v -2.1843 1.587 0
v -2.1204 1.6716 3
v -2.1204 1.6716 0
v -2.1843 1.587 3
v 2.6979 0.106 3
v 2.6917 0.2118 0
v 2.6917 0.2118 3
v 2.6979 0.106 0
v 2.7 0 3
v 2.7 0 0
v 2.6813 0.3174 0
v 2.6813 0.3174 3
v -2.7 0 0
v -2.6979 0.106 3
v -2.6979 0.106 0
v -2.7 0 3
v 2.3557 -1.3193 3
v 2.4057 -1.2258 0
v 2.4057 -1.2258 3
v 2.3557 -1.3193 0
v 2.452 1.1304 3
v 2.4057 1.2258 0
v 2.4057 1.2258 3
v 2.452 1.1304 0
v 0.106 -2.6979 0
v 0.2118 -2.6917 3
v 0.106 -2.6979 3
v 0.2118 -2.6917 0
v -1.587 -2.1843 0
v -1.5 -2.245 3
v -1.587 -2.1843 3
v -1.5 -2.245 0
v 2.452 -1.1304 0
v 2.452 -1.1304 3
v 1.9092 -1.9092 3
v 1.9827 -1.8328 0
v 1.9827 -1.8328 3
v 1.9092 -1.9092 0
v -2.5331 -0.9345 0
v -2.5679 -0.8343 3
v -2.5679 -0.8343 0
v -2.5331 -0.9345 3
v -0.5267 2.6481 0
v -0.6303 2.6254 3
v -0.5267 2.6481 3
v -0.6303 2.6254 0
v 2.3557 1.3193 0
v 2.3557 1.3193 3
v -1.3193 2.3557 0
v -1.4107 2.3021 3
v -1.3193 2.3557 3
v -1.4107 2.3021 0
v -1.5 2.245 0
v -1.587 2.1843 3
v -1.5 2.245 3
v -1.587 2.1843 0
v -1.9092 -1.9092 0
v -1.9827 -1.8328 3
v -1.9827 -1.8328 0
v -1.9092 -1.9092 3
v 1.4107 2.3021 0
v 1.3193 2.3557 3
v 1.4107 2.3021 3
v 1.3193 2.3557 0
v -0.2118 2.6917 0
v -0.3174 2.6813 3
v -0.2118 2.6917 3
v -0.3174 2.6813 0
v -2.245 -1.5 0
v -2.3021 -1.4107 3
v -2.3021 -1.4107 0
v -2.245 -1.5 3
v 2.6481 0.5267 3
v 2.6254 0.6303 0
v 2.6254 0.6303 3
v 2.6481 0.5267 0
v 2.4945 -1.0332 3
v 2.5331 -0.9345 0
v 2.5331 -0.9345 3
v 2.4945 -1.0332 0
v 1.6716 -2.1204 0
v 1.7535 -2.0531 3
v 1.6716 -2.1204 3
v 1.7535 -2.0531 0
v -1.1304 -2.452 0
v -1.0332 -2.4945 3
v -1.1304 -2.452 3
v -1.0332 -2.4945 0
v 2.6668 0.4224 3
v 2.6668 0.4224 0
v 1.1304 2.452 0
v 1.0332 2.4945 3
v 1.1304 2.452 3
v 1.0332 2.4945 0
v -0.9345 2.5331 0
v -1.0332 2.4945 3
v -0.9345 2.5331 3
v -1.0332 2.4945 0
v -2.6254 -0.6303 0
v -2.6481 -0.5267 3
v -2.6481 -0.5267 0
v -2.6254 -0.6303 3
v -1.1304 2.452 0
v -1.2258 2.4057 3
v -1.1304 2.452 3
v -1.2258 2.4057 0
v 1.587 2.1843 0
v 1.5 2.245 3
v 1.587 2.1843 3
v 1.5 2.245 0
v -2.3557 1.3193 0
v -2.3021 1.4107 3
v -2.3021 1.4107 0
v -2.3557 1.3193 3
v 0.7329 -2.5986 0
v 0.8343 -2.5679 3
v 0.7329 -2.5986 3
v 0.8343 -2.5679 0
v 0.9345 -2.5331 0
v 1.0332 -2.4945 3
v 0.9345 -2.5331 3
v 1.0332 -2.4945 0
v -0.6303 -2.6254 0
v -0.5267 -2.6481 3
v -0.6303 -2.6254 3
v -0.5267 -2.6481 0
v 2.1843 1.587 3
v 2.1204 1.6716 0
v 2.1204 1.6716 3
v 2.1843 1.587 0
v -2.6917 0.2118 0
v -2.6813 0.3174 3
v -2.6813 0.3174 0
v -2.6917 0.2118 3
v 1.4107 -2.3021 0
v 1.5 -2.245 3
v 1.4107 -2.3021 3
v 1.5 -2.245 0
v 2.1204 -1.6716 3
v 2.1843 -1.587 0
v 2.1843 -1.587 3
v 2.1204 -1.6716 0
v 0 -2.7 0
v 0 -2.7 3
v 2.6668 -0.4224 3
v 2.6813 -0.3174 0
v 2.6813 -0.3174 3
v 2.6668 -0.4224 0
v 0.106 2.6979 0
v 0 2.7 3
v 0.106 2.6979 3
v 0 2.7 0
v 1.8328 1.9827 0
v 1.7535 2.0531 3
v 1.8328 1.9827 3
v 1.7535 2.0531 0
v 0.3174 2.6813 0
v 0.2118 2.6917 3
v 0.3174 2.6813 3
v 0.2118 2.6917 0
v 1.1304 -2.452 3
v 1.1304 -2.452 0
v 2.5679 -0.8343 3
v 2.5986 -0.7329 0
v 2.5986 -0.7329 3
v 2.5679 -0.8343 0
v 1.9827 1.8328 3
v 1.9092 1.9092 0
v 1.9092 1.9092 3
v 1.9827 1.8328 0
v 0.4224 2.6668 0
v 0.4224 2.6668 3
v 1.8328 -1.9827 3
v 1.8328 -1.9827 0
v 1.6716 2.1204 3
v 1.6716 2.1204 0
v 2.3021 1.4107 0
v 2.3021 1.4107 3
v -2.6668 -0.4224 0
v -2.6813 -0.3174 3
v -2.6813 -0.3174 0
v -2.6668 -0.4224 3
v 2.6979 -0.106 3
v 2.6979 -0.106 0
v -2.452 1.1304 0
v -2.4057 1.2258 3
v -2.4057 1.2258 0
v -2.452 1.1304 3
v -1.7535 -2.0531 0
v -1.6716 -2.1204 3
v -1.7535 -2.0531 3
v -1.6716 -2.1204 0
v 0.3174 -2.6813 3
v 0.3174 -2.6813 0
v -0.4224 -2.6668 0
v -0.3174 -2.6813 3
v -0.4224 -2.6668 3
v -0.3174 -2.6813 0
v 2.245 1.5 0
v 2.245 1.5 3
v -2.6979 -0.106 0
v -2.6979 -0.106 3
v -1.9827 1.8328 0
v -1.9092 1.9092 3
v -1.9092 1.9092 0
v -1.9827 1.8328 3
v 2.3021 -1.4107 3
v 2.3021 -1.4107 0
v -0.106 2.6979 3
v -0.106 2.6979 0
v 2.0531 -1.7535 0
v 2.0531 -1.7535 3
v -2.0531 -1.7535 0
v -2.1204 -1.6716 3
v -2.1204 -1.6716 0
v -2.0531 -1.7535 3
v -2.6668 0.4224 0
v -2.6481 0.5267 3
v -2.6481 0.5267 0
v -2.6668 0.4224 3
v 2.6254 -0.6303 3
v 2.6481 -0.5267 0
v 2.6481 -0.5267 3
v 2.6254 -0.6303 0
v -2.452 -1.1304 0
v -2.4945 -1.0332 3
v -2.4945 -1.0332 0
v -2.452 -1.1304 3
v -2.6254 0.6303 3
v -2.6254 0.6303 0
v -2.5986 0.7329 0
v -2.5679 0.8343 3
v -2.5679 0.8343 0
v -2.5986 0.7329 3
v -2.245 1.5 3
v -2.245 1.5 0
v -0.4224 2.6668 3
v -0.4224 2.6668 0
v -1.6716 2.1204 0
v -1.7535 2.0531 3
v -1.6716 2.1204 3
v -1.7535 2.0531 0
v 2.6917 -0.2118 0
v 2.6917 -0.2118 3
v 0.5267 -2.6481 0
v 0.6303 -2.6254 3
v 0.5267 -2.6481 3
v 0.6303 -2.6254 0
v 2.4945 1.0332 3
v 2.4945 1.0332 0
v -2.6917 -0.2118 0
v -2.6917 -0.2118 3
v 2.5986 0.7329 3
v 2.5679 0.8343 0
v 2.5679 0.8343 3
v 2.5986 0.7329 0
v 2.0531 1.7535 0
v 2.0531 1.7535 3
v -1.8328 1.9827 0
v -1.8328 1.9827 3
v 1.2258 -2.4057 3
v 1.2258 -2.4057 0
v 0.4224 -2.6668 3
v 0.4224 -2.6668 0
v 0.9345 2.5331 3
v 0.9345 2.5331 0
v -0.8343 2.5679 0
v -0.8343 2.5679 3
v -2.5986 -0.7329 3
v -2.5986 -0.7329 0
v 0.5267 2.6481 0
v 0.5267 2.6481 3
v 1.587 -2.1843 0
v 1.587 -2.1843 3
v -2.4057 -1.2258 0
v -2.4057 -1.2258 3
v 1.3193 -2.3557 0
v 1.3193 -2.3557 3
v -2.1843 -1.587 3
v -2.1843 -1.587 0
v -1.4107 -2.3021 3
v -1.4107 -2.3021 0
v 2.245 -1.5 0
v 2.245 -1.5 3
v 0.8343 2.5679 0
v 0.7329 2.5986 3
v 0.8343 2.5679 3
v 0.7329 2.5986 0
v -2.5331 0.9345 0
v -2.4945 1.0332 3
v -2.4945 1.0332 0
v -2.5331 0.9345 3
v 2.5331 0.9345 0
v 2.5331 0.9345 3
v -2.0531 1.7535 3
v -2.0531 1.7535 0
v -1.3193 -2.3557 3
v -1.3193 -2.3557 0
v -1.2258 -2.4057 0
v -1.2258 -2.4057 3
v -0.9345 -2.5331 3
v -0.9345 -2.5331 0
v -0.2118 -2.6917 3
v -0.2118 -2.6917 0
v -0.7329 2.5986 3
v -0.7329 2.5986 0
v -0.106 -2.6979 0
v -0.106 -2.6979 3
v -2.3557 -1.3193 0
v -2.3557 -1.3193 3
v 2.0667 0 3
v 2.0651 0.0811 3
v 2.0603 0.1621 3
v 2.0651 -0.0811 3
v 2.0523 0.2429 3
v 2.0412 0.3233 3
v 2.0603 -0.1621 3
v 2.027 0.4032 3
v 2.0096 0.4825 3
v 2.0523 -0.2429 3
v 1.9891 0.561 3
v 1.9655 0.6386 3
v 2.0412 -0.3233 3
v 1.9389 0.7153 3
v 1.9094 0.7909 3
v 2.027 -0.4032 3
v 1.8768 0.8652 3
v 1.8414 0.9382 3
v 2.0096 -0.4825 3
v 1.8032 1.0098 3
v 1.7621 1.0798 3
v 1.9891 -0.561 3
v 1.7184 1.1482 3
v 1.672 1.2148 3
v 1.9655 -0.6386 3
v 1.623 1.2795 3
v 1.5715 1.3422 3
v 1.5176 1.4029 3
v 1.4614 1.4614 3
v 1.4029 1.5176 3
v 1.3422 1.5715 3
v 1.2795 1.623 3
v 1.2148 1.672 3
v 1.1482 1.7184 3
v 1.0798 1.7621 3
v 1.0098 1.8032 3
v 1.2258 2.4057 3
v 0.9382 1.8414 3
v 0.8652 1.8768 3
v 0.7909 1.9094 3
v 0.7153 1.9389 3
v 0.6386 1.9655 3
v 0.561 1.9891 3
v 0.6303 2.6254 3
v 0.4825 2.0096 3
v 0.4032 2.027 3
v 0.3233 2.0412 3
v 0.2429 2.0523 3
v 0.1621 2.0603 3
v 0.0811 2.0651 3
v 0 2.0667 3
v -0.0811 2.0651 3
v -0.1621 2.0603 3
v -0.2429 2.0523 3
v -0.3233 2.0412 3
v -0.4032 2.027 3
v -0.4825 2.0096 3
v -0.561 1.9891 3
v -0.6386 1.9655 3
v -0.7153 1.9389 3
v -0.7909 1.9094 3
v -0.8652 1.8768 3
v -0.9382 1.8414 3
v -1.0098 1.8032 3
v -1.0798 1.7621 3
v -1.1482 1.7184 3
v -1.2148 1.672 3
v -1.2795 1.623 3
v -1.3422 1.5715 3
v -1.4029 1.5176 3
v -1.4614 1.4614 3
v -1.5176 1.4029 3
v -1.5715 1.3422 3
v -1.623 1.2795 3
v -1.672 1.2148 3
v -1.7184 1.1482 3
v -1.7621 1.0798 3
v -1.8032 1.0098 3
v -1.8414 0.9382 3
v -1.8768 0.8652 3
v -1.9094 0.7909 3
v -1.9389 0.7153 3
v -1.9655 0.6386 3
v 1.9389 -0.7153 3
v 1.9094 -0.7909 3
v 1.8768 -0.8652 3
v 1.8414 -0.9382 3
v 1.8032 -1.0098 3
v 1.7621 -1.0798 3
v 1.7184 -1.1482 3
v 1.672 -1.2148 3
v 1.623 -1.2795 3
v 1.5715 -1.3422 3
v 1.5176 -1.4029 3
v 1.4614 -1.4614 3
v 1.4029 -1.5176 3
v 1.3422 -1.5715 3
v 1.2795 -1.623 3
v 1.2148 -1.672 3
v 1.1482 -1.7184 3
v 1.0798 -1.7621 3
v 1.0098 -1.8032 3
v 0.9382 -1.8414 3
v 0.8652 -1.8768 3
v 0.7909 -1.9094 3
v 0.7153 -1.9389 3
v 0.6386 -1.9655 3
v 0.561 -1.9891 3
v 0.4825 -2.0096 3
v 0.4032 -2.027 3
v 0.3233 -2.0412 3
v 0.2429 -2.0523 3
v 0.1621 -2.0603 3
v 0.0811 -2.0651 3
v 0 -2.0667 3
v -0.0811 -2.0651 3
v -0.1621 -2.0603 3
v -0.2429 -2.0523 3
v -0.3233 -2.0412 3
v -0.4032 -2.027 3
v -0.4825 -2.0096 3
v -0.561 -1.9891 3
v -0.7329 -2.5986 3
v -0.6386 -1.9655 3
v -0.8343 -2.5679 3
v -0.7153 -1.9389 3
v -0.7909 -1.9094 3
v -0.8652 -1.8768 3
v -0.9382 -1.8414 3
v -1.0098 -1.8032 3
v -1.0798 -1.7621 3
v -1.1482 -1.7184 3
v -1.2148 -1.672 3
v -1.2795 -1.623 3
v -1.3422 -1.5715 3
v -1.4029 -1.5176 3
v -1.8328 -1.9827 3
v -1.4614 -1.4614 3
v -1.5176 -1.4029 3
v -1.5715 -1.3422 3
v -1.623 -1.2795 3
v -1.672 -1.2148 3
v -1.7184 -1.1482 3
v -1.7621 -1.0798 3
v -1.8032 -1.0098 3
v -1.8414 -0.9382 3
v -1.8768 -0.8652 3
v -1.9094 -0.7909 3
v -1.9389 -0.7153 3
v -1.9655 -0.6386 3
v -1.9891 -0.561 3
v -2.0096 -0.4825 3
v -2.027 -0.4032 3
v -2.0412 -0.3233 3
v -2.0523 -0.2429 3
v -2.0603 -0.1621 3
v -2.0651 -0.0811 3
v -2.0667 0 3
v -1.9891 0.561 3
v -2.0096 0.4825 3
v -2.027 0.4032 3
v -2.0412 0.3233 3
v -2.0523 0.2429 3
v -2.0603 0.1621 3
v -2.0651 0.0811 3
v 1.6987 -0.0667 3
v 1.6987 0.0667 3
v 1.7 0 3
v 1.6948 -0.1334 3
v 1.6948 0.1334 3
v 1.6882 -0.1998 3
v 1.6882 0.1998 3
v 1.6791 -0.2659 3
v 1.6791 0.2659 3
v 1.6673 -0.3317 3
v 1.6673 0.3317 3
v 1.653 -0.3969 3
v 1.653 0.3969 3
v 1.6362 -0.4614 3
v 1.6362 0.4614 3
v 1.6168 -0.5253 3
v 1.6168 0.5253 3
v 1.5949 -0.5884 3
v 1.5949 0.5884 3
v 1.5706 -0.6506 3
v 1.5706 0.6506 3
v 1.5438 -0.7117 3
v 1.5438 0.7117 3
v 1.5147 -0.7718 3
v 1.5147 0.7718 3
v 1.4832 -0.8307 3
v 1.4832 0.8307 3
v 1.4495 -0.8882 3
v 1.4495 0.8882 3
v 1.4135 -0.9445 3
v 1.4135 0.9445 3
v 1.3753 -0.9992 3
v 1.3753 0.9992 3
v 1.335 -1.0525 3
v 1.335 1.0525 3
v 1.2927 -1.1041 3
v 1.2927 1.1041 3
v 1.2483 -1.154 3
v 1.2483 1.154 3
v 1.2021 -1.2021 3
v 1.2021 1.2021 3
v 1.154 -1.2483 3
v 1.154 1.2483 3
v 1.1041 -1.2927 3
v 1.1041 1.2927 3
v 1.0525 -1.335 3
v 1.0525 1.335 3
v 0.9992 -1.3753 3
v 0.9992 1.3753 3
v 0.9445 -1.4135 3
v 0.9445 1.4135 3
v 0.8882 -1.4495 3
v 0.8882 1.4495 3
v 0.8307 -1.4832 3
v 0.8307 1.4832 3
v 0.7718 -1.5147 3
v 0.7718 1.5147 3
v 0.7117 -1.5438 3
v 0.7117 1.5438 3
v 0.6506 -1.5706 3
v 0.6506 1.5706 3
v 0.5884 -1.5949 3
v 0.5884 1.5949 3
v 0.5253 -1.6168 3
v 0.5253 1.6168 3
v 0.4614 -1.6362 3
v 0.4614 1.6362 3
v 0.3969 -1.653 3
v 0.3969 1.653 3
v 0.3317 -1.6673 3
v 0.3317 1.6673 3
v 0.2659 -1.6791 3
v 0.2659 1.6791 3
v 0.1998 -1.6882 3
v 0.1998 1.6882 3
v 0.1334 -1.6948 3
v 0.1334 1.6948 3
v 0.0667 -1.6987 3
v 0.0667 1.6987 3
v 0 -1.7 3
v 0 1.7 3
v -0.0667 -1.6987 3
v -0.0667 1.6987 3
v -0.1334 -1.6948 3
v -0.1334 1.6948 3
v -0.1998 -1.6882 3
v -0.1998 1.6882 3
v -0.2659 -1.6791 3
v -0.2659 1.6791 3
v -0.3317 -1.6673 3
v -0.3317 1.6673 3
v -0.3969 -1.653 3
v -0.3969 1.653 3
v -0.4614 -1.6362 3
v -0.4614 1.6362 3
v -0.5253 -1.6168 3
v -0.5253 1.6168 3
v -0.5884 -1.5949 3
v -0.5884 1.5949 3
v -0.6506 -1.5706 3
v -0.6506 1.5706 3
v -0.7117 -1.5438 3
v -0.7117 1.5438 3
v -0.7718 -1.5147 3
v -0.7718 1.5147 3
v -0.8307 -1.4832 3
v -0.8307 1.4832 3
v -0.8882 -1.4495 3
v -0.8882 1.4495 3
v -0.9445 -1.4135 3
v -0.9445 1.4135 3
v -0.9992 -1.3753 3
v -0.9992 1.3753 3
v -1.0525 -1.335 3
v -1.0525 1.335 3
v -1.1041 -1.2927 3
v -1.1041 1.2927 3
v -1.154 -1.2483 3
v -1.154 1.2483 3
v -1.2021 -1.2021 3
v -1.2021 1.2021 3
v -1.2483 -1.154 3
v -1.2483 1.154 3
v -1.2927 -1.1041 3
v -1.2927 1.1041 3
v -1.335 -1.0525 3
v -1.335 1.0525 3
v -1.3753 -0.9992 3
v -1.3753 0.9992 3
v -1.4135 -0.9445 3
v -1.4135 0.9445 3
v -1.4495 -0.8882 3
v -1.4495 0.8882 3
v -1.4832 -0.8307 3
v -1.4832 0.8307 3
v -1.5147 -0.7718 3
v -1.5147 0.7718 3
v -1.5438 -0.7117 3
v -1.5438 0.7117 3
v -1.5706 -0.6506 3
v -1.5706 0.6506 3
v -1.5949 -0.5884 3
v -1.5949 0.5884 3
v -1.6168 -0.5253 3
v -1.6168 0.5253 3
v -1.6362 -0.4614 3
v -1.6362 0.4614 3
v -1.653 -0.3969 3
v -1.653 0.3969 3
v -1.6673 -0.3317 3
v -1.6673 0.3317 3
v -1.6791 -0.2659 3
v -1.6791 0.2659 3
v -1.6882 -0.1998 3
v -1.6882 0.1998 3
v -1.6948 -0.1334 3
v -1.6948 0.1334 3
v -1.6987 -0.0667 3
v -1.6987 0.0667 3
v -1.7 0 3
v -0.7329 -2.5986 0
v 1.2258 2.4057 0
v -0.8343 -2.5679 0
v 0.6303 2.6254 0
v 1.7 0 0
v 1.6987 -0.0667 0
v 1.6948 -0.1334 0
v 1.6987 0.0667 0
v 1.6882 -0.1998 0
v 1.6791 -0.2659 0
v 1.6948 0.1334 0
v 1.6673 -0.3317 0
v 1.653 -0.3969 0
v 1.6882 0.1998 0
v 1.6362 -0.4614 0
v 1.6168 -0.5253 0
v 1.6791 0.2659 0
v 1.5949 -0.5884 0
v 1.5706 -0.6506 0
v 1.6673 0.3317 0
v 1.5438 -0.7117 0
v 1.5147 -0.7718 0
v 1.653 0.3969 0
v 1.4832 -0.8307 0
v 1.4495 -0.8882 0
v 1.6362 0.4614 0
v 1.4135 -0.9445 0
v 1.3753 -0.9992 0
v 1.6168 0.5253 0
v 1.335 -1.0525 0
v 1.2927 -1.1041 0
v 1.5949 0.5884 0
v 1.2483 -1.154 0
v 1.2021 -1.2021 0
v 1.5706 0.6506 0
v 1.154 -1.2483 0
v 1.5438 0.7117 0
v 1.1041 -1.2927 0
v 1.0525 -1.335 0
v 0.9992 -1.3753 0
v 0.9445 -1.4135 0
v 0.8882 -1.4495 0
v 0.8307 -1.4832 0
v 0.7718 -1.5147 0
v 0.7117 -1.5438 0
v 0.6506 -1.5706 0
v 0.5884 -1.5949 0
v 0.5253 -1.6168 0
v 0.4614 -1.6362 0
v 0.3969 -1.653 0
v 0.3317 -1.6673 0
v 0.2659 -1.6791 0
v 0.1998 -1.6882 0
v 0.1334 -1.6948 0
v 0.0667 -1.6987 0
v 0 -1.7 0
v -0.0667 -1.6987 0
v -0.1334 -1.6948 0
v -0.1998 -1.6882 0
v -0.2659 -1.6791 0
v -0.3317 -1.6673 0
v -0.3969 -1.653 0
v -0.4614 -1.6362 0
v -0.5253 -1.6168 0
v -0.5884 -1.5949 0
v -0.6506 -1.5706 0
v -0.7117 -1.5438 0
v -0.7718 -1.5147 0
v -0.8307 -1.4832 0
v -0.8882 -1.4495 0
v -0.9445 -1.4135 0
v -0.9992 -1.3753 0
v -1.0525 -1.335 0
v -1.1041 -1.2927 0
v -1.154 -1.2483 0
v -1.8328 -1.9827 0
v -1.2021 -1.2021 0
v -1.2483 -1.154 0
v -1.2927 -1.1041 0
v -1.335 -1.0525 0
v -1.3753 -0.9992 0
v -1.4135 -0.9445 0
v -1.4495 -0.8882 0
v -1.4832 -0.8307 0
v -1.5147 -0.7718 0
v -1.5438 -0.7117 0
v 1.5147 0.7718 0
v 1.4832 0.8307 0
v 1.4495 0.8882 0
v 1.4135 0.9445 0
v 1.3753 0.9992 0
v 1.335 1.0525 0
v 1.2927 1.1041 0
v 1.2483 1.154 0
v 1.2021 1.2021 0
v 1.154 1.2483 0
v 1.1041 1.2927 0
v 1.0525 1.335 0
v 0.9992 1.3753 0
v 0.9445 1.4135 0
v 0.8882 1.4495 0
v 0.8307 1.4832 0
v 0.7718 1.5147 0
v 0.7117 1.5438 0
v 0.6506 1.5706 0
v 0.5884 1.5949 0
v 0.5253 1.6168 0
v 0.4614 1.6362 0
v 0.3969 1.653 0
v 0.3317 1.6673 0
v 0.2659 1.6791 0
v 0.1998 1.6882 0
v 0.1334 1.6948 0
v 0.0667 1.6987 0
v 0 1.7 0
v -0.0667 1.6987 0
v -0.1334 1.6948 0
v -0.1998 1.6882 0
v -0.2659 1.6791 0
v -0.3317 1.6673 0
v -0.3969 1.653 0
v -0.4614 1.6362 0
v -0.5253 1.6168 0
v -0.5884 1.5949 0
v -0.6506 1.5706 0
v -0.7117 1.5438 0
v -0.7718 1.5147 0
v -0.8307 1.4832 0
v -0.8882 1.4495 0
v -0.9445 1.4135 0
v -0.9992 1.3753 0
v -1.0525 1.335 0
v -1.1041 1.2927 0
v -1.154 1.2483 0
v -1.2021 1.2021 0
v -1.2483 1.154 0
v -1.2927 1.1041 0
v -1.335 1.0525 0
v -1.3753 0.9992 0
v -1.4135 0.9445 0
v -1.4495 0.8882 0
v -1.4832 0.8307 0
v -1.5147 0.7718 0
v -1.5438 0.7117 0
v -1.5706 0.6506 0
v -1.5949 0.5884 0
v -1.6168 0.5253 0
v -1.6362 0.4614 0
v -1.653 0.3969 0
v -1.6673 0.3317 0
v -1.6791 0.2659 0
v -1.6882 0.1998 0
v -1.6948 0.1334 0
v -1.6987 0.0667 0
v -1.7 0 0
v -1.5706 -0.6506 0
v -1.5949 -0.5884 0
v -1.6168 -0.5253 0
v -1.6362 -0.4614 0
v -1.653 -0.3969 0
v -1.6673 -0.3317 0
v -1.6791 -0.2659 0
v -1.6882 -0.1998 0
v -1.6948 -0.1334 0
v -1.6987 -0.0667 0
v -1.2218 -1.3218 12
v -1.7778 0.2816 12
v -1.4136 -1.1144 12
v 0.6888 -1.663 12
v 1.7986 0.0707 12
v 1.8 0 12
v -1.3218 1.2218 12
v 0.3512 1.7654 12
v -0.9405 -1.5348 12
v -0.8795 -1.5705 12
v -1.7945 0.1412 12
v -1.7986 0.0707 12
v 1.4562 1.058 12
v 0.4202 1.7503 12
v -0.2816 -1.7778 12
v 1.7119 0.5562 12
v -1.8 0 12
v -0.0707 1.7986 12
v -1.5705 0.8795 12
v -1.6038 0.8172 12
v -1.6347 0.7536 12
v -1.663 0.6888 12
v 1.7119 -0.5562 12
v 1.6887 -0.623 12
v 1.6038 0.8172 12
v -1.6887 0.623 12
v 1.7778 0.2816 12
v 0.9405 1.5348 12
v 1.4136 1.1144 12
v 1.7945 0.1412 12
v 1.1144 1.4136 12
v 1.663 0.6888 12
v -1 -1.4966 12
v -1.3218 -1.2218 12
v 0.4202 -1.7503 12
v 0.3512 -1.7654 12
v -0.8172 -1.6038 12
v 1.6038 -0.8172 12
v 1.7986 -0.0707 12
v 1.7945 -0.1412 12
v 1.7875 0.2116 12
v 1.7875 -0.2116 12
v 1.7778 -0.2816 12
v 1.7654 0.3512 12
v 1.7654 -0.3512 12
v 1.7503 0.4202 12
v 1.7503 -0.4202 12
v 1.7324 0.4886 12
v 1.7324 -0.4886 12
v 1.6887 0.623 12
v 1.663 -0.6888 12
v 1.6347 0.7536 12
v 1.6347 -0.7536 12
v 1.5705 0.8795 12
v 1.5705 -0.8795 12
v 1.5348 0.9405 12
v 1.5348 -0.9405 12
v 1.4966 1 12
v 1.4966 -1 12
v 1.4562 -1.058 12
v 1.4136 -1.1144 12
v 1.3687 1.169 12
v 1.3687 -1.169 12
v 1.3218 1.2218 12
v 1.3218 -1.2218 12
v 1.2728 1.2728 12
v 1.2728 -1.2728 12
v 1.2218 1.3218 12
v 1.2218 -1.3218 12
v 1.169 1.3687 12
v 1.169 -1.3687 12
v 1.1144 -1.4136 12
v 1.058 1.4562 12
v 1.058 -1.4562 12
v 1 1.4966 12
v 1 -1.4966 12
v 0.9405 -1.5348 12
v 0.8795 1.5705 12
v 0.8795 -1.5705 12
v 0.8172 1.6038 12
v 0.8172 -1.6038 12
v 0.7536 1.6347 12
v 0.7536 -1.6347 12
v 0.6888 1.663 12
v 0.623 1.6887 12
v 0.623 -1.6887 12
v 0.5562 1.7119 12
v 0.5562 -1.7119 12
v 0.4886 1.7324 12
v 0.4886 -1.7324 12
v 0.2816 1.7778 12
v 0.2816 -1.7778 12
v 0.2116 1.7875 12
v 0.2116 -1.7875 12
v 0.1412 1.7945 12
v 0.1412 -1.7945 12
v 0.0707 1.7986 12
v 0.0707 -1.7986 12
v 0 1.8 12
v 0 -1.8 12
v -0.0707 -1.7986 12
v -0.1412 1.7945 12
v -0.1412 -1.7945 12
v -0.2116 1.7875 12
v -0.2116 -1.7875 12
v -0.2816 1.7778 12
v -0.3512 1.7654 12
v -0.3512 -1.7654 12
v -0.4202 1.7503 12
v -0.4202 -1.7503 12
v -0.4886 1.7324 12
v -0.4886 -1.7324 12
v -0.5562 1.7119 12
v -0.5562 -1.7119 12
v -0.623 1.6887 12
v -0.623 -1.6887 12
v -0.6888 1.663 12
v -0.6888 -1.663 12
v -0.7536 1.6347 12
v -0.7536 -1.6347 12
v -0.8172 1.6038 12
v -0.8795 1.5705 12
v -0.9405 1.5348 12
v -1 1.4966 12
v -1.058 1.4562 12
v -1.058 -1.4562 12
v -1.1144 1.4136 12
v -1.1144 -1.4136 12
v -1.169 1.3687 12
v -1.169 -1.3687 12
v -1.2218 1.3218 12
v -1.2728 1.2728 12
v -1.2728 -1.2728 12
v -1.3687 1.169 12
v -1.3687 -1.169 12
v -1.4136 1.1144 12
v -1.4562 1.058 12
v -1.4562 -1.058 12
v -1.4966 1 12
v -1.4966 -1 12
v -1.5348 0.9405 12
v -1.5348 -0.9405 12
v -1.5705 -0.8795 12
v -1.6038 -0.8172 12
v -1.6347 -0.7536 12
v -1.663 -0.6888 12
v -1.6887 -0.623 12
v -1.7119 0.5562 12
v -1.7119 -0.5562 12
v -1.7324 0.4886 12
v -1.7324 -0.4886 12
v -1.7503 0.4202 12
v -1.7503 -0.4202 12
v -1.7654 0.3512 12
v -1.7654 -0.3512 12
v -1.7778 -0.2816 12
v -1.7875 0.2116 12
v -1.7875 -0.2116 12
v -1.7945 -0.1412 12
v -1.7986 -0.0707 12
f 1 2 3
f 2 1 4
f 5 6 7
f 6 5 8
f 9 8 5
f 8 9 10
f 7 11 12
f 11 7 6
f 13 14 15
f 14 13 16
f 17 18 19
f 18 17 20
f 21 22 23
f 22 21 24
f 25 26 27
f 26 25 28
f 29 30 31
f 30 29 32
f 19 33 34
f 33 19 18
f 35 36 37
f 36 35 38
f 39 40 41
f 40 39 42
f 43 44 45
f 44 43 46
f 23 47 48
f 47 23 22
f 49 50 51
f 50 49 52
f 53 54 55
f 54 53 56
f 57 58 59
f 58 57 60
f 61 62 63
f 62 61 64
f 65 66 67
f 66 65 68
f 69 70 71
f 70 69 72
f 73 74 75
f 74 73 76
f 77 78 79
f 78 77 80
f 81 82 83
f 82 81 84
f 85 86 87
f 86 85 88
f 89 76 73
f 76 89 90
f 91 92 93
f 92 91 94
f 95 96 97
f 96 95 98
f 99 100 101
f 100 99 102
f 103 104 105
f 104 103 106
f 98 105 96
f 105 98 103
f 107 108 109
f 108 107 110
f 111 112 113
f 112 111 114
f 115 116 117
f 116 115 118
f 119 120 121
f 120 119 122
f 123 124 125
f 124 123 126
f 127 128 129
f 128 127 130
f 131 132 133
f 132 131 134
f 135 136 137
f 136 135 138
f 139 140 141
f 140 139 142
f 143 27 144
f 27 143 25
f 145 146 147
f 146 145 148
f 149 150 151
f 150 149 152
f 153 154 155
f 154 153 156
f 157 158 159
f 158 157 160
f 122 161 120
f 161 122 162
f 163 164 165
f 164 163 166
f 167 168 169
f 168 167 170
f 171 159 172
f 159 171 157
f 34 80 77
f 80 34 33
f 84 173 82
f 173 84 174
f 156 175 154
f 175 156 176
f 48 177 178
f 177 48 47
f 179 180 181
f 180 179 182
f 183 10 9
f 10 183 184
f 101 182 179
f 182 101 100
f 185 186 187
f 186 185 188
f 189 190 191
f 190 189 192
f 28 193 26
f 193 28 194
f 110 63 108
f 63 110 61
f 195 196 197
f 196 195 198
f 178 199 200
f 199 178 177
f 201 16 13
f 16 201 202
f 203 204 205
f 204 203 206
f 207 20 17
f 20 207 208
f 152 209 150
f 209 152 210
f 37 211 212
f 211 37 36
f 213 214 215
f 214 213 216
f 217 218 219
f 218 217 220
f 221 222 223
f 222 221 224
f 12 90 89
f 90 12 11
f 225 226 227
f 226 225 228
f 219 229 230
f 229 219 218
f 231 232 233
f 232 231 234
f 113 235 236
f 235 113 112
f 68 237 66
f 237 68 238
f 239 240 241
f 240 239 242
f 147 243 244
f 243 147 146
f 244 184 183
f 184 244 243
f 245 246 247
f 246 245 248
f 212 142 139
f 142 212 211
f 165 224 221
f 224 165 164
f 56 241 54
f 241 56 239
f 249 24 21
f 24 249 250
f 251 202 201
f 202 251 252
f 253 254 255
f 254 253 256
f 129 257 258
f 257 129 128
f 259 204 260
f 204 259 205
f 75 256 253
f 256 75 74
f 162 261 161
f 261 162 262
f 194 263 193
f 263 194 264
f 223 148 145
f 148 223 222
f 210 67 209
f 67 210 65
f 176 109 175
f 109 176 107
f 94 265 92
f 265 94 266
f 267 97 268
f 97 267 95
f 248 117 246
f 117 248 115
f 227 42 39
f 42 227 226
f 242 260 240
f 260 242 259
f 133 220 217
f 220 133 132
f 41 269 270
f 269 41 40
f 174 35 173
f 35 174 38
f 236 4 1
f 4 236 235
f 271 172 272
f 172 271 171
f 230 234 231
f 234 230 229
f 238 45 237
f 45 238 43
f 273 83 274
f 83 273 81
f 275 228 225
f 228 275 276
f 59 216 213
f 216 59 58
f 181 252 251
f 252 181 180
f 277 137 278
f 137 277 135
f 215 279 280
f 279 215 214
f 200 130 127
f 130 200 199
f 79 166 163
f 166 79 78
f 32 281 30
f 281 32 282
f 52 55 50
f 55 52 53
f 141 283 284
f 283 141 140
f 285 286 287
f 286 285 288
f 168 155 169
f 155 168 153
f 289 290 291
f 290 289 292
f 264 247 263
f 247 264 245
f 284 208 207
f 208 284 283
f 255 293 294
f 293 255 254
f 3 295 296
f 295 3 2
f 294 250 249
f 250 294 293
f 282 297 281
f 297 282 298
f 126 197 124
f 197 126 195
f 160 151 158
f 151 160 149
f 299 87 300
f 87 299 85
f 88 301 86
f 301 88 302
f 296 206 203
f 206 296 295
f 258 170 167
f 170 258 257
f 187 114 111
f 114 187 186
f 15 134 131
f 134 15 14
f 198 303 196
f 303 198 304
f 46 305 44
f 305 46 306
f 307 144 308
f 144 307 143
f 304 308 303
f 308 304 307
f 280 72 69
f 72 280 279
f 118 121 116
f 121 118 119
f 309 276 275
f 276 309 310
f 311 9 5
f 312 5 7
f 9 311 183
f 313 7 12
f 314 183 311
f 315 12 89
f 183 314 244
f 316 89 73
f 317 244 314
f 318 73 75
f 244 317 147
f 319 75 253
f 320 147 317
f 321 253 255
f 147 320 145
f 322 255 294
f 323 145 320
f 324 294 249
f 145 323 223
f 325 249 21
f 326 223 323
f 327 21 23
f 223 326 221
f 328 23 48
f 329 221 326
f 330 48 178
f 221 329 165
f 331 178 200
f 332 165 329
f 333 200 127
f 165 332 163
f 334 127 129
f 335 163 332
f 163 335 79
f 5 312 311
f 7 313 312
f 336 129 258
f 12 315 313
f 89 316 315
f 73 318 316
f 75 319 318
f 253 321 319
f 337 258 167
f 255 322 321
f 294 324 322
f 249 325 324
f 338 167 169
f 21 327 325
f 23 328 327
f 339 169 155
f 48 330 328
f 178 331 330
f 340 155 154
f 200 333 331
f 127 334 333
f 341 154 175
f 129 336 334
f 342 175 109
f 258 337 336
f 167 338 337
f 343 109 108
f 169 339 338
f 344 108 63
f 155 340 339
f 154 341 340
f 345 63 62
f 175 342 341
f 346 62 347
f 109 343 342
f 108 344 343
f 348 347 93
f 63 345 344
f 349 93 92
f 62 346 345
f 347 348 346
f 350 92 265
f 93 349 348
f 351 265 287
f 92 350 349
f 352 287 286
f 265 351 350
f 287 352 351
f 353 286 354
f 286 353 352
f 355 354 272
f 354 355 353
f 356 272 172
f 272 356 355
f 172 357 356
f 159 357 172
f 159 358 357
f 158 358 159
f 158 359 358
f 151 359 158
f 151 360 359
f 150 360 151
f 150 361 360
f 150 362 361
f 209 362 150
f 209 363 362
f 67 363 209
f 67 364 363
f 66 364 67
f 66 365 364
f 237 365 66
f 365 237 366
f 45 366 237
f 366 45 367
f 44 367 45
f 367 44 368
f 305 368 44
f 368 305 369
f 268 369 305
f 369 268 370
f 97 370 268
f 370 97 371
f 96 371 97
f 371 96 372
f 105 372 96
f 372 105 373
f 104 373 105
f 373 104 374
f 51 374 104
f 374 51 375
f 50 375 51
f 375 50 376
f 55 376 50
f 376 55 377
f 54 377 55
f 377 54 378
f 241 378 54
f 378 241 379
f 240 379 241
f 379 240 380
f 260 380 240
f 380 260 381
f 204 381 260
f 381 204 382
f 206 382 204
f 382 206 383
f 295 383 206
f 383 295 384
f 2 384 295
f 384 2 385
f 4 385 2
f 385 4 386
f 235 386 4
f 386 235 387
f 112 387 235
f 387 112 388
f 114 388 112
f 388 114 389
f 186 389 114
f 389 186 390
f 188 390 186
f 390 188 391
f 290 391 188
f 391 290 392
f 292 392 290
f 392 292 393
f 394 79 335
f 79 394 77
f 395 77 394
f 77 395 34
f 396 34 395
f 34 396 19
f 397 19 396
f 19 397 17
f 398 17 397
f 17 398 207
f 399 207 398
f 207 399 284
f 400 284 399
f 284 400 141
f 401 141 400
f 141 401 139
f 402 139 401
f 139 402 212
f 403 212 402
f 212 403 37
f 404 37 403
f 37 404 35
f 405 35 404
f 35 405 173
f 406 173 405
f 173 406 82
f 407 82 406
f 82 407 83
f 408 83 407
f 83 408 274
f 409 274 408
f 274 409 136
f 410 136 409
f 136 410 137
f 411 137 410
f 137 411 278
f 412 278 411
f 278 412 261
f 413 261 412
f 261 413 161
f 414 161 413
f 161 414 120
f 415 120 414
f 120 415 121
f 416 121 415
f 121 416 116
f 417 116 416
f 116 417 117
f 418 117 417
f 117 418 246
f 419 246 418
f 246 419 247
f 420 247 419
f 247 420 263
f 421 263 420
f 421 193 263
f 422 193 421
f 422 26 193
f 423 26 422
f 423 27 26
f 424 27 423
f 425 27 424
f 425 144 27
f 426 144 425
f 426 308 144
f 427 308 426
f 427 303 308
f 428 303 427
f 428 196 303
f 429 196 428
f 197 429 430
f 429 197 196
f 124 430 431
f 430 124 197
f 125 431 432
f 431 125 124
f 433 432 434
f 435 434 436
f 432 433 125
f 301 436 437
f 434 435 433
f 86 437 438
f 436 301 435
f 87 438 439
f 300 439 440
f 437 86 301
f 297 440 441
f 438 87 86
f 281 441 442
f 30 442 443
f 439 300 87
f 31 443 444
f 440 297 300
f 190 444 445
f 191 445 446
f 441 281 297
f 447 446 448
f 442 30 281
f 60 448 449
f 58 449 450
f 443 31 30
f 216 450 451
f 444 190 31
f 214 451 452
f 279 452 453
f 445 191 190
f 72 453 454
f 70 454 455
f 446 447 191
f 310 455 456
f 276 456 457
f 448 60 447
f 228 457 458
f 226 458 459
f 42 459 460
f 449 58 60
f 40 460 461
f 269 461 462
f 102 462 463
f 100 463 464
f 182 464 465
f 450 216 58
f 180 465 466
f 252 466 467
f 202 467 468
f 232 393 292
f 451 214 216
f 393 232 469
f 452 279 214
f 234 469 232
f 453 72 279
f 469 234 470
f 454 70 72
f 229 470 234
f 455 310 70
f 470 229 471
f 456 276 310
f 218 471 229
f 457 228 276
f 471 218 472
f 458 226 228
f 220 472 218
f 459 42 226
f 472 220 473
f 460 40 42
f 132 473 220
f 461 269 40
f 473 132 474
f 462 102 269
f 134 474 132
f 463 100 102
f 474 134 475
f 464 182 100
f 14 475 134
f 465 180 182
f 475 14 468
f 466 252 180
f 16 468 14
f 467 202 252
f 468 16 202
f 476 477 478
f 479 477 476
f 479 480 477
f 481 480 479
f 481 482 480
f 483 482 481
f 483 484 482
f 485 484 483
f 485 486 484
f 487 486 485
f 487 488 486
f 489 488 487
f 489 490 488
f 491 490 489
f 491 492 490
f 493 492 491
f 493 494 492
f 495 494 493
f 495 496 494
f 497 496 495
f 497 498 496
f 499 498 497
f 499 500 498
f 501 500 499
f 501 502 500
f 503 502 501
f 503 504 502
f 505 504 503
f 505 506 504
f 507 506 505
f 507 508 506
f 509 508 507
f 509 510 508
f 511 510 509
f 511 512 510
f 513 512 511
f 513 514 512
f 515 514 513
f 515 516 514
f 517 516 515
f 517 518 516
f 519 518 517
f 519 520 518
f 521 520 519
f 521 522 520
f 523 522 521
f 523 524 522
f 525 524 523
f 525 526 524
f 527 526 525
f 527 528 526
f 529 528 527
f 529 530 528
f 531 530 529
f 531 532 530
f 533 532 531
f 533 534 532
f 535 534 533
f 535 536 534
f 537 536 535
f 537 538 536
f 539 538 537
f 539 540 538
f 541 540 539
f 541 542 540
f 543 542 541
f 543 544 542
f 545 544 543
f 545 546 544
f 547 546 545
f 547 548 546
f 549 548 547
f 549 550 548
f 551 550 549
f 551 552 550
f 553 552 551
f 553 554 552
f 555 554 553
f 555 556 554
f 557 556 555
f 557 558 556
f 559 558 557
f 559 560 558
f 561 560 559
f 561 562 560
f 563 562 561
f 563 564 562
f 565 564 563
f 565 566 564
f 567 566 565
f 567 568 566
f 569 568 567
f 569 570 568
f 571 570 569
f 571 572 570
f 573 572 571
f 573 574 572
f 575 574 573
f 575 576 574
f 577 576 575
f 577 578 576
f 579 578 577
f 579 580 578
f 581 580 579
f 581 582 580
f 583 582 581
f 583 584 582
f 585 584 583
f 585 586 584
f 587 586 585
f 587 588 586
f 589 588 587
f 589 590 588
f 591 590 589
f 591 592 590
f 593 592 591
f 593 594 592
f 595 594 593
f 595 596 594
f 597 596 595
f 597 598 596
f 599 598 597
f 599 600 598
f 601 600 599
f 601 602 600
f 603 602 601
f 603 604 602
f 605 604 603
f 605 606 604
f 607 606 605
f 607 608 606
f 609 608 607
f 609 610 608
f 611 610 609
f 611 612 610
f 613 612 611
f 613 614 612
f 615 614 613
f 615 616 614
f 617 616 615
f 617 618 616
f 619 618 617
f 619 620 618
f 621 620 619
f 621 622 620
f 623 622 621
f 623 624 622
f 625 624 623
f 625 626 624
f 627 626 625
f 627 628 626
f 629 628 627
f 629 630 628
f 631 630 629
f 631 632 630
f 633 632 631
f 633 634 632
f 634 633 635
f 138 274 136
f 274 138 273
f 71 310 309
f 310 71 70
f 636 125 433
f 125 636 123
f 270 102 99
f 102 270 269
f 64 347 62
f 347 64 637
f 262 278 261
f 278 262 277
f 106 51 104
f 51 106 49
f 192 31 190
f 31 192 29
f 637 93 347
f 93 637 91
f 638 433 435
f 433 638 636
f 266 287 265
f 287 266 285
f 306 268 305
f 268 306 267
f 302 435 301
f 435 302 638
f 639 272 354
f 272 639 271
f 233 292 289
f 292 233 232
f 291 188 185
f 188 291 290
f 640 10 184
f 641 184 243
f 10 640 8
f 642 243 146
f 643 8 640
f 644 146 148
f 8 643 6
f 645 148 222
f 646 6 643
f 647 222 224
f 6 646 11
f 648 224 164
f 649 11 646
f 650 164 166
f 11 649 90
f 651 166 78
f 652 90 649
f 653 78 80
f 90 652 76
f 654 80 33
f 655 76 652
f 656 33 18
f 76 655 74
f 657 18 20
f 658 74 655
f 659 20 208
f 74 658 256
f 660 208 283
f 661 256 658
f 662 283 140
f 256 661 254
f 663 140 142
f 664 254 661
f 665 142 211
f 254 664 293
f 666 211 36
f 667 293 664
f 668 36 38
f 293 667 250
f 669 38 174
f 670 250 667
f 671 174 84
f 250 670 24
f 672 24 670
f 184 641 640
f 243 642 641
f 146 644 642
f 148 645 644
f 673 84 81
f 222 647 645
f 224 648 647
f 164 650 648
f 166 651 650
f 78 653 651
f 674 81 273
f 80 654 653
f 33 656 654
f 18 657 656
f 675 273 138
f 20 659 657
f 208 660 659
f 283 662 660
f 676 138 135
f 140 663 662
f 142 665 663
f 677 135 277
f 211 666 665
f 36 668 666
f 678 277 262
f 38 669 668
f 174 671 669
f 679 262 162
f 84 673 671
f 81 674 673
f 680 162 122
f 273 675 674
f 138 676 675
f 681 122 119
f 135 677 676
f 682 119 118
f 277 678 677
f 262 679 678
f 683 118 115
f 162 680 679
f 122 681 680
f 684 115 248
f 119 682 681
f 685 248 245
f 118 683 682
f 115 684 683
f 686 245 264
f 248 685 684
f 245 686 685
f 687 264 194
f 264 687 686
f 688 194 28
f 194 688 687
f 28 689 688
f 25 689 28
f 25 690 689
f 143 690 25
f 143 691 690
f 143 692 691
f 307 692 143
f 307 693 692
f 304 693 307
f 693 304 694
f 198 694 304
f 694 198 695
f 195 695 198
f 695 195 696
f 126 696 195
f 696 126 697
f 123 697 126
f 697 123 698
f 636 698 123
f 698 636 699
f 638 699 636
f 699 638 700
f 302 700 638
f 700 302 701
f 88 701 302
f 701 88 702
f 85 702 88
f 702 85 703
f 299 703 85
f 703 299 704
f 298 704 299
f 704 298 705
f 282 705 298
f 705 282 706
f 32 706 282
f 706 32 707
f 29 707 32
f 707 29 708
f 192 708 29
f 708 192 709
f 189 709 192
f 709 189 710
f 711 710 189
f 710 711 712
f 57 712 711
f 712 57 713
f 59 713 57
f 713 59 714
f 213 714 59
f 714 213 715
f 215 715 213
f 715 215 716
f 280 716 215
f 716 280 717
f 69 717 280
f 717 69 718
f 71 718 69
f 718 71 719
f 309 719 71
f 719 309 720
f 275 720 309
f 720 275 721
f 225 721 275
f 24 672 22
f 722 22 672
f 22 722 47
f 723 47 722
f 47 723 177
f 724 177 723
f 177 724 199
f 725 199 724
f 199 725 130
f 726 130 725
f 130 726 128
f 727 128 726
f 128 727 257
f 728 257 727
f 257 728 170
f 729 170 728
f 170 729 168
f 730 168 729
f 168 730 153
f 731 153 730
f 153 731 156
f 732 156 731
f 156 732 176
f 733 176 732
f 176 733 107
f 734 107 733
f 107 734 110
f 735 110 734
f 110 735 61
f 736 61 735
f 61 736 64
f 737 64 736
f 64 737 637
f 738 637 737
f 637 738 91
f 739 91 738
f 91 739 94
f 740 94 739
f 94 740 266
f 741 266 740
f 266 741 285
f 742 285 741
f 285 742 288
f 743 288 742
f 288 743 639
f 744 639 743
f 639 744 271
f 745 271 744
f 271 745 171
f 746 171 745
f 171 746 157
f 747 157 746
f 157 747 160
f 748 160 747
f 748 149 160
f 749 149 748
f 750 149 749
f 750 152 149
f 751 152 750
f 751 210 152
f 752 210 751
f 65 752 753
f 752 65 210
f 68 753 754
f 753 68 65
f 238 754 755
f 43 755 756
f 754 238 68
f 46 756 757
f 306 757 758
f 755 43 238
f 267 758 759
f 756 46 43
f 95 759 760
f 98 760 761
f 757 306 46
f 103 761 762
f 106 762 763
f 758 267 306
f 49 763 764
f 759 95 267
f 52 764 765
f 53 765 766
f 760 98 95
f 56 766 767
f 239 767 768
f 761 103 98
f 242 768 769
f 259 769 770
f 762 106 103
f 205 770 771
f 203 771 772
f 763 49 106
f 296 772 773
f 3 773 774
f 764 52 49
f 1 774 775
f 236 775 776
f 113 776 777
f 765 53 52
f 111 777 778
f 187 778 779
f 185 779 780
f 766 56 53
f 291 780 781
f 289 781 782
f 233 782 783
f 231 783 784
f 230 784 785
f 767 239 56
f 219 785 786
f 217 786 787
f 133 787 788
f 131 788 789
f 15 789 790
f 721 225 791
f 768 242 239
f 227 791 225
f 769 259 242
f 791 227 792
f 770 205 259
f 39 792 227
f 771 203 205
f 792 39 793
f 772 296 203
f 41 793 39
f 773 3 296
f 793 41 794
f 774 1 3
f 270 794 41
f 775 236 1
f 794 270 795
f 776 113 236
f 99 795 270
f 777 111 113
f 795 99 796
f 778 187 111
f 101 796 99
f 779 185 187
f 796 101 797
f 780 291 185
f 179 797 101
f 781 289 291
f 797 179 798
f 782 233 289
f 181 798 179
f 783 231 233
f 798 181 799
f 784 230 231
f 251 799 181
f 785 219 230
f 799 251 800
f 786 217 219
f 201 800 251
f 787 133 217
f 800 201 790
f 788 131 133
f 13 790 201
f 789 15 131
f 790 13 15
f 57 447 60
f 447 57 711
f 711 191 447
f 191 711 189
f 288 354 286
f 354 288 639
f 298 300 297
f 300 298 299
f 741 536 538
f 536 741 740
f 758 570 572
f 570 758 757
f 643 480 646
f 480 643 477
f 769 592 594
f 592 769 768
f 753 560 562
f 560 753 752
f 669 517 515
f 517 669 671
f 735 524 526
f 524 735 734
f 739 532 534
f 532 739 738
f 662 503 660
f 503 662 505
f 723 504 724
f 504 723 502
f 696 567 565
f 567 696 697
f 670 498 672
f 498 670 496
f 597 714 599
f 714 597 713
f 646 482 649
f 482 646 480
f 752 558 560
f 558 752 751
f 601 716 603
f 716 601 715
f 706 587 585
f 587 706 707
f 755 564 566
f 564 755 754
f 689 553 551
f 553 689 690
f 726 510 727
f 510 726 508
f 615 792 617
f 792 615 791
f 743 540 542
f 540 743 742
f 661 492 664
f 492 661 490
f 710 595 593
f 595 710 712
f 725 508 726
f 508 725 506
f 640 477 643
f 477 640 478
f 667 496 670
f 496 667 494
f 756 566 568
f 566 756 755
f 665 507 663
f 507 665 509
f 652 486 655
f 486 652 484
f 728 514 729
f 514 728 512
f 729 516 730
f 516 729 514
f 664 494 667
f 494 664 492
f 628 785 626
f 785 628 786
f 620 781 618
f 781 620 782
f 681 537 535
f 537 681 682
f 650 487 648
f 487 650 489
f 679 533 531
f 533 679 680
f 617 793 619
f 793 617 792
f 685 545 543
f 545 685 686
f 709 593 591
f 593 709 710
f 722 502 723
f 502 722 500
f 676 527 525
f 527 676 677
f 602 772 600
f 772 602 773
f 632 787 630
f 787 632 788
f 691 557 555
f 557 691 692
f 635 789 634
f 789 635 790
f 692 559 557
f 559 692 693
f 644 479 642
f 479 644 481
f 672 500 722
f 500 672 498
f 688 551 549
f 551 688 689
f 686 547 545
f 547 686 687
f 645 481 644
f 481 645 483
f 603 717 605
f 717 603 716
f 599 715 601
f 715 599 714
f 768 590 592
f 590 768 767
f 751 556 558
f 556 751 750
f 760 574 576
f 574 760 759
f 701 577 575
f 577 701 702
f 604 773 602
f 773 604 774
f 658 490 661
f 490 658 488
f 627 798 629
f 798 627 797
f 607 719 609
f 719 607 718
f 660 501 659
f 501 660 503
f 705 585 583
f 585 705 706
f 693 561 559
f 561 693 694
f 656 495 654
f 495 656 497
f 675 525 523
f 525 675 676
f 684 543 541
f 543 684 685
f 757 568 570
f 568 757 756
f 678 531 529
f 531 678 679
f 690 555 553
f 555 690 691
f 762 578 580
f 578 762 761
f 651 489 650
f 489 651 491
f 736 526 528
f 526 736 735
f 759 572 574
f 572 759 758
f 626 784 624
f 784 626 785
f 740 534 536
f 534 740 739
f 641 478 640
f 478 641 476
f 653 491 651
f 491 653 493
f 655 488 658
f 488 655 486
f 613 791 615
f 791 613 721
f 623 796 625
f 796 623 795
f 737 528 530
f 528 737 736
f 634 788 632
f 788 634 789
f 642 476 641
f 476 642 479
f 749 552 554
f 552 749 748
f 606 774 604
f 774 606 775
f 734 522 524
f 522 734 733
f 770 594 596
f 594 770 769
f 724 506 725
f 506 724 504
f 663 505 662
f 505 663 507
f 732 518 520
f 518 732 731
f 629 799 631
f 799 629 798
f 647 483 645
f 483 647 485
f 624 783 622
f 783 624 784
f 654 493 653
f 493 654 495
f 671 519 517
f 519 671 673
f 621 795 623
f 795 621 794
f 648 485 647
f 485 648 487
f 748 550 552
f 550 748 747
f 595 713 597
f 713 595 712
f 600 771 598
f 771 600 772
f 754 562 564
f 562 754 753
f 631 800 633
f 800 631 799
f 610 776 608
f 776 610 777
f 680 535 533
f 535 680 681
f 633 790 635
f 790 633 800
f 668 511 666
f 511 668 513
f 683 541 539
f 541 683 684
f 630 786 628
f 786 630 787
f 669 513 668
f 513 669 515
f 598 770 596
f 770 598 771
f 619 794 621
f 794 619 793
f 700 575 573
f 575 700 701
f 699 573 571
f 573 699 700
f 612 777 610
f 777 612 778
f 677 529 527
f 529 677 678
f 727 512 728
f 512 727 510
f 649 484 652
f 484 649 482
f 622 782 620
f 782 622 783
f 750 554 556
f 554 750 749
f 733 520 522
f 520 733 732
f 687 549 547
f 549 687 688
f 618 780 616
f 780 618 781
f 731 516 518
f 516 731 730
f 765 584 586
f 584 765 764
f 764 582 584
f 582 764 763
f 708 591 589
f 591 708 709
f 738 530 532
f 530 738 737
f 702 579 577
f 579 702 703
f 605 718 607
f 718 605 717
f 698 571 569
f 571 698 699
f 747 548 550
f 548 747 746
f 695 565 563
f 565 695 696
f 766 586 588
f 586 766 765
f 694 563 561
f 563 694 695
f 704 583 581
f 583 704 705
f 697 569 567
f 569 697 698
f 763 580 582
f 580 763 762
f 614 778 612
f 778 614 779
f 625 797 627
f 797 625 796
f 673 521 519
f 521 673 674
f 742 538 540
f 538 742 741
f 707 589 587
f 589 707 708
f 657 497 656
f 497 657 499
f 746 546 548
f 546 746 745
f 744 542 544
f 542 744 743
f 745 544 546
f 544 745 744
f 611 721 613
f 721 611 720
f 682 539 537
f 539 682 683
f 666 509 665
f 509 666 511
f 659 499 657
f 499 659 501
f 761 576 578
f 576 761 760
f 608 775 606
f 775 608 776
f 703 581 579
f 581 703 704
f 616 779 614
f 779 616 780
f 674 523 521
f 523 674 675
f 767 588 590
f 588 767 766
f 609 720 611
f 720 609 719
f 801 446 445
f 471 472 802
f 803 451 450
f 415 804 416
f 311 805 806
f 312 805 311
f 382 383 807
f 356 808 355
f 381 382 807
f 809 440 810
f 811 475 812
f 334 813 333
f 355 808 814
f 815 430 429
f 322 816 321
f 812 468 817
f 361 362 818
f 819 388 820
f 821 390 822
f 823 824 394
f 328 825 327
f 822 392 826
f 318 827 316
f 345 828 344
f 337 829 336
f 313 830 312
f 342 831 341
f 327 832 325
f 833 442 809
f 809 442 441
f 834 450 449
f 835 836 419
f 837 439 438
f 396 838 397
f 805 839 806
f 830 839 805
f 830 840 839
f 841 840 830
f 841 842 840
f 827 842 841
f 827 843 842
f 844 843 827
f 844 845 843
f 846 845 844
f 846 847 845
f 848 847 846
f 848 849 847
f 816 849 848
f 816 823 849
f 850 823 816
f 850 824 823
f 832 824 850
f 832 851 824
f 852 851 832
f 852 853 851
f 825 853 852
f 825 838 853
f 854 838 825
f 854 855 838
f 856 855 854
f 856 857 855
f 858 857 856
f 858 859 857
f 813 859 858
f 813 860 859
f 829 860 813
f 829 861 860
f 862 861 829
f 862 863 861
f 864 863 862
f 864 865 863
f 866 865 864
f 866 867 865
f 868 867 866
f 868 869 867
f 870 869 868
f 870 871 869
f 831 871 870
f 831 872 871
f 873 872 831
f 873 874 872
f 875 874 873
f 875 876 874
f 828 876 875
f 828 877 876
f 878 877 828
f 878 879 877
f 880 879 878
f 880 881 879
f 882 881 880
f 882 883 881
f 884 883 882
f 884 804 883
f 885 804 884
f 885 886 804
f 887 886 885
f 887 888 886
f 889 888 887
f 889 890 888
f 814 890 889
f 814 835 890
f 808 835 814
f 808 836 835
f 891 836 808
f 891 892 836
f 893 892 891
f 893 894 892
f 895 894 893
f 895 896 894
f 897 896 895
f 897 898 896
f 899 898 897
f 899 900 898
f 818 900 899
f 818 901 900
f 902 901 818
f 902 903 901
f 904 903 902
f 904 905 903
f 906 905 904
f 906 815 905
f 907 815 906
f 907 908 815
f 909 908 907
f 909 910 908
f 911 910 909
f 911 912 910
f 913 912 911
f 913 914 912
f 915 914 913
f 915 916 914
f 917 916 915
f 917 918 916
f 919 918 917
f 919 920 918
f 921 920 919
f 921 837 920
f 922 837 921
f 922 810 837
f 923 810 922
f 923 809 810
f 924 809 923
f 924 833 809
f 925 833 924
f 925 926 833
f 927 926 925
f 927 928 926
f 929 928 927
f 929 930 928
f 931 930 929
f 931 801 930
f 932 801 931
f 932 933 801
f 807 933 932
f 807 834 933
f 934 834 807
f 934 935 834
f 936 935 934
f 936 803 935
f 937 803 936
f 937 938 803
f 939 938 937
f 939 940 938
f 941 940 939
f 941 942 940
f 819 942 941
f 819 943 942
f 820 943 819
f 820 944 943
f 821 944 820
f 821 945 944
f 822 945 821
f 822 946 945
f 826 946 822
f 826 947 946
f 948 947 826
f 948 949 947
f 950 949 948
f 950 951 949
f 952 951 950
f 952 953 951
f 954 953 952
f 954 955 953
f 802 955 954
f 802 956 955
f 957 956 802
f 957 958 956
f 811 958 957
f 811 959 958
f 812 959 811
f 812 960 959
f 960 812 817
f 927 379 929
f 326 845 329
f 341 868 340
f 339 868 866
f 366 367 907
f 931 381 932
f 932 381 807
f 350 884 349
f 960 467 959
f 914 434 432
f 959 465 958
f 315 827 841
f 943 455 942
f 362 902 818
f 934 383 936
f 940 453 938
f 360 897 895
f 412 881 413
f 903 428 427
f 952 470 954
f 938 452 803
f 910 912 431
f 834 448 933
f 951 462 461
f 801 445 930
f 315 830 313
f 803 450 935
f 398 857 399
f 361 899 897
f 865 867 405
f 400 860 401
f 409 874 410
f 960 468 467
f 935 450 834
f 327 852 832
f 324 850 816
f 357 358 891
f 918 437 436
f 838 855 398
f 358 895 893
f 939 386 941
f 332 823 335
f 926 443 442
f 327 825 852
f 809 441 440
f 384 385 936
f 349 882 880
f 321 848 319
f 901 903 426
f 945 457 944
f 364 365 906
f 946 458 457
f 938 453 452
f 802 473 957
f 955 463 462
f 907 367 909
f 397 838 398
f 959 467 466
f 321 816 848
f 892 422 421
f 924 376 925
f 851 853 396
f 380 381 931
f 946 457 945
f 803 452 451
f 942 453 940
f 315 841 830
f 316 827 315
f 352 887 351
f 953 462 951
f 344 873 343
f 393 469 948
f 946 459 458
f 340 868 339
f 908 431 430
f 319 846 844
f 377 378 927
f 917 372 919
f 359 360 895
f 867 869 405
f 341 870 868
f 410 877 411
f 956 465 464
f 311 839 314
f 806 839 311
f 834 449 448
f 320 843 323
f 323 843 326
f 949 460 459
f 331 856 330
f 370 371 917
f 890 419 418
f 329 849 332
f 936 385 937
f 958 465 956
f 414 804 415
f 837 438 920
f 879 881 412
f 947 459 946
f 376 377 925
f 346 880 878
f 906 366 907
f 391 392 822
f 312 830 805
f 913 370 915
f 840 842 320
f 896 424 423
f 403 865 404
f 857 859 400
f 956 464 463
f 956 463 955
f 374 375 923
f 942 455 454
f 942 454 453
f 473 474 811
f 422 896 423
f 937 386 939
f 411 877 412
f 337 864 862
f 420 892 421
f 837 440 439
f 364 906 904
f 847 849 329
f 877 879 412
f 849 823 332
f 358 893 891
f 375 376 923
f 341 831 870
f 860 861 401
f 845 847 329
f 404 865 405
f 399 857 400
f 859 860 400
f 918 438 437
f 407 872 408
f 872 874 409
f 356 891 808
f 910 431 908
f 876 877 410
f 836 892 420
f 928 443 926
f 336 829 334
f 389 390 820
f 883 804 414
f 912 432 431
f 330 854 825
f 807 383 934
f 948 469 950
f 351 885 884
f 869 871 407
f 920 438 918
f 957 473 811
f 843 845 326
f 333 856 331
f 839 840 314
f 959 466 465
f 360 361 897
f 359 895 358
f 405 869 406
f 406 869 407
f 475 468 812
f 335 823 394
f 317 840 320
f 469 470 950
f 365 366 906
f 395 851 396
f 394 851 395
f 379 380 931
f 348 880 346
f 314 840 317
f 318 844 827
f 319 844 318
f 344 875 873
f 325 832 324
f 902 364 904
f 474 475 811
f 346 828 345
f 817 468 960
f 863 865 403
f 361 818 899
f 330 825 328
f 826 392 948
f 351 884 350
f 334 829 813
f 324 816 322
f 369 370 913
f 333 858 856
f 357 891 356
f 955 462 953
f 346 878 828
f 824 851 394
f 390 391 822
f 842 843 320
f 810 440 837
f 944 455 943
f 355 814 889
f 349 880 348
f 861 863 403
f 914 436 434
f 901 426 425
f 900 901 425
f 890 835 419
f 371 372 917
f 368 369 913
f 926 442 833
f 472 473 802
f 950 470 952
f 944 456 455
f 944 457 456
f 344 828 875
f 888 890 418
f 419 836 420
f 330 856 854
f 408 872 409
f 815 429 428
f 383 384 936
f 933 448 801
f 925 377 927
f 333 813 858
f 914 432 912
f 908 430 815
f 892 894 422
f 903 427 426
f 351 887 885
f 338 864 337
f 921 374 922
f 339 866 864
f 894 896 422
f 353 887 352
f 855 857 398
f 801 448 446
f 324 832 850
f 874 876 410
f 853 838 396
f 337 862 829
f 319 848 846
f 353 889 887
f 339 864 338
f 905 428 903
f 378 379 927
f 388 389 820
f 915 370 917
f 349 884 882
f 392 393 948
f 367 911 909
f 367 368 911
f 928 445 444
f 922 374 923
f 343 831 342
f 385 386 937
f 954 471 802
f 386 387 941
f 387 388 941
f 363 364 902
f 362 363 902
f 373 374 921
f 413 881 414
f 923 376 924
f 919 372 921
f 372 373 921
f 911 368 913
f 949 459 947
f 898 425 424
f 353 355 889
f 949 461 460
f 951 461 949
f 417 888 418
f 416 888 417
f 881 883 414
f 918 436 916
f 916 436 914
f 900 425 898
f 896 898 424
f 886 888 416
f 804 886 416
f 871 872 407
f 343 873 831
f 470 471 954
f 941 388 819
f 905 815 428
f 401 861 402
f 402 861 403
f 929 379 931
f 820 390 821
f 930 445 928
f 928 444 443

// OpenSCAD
/*

button cap voor druktoets van Chance-Delay-O-Matic
*/

$fn = 160;

binnendiameter = 3.4;
binnenhoogte = 3;

module binnenCylinder() {
    cylinder(binnenhoogte, r1 = binnendiameter / 2, r2 = binnendiameter / 2);
}

buttonCapHoogte = 9;

buitendiameter = binnendiameter + 2;

module buitenCylinder() {
    cylinder(binnenhoogte, r1 = buitendiameter / 2, r2 = buitendiameter / 2);
}

module buttonCap() {
    cylinder(buttonCapHoogte, r1 = (buitendiameter + 7) * 1 / 6, r2 = buitendiameter * 2 / 6);
}

module alles(a = 0, b = 0) {
    if (a == 1) {
        translate([0, 0, binnenhoogte]) buttonCap();
    }
    if (b == 1) {
        difference() {
            buitenCylinder();
            #binnenCylinder();
        }
    }
}

alles(1, 1);
